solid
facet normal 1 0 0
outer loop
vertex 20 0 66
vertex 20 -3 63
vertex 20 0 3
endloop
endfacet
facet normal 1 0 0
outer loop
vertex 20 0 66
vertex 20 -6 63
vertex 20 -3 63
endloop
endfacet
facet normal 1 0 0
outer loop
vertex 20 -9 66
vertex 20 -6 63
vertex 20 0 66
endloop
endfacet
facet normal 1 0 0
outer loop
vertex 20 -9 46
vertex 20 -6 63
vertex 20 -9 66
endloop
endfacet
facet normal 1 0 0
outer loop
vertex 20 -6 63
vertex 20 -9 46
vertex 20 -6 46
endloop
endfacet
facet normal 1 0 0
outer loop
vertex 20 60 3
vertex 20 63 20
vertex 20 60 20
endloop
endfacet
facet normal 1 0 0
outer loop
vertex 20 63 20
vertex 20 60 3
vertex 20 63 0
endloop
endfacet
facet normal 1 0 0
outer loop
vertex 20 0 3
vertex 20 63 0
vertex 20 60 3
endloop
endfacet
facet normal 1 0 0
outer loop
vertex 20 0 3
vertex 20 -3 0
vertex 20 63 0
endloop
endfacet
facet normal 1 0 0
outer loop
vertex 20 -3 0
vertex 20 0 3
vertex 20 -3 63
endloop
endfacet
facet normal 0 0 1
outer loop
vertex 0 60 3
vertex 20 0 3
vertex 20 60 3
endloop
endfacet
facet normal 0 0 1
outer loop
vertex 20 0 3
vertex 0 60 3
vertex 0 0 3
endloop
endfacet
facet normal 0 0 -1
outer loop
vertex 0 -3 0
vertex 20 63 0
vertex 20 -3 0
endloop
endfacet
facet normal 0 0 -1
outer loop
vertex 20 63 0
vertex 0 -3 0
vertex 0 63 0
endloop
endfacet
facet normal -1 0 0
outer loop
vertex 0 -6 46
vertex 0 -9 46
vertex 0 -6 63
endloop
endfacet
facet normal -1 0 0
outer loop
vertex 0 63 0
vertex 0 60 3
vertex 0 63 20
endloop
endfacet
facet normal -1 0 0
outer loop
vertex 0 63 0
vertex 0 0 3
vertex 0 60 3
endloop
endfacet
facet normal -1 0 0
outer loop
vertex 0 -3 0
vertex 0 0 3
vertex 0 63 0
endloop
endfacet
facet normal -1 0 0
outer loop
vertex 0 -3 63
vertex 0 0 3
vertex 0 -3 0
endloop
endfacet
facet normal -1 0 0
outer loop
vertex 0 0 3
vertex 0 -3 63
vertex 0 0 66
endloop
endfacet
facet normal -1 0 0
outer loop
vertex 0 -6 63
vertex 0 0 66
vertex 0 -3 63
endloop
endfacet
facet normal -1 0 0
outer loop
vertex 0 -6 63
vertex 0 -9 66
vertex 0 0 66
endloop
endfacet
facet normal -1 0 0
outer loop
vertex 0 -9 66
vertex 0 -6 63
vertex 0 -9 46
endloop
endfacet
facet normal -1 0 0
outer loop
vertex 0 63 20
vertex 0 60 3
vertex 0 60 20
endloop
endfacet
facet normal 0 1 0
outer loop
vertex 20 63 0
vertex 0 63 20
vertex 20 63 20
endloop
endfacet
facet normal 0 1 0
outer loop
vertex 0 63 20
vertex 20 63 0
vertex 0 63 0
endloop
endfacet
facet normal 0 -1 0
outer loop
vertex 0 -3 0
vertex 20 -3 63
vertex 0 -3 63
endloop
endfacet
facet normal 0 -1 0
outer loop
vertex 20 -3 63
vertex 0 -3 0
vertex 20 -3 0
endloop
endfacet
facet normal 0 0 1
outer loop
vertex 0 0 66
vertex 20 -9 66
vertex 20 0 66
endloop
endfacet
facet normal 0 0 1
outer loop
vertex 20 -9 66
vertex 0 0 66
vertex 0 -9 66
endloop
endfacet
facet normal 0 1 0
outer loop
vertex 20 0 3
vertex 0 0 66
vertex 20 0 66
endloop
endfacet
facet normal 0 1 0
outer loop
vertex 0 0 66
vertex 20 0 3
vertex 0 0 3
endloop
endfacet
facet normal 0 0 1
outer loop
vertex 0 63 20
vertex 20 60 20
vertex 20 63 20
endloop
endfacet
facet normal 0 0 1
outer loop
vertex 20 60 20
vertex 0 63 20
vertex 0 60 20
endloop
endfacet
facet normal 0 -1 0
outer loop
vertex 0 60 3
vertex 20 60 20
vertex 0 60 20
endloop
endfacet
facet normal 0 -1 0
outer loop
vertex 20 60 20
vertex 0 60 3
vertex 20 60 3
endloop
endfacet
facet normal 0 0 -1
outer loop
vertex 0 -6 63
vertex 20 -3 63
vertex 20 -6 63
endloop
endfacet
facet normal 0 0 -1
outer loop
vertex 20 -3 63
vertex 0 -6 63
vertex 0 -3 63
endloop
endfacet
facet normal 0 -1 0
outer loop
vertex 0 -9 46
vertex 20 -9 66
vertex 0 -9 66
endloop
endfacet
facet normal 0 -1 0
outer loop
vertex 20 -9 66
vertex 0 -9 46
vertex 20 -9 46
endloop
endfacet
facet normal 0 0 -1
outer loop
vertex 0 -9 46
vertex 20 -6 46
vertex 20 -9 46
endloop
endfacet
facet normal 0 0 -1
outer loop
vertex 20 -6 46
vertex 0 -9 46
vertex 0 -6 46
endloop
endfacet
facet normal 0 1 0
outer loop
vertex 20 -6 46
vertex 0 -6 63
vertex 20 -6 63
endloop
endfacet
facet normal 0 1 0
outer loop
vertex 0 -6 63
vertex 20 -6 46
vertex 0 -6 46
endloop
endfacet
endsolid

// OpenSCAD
// file: grate.scad
include <../../library/profiles.scad>
include <./config.scad>

module grateTemplate(grateLength = 600, grateWidth = 400) {
    module partsList() {

    }

    partsList();

    // hinten
    cube([grateLength, profileSize + 5, profileSize+ 5]);
    
    // vorne
    translate([0, grateWidth - profileSize, 0])
    cube([grateLength, profileSize, profileSize]);
    

    // rippen
    amount = round(grateLength / 35);
    startPos = 18;
    echo(str("anzahl ", amount))
    for ( i = [0 : amount - 1] ) {
        translate([(i * 35) + startPos, 0, 45])
        rotate([45, 0.5, 90])
        lShapeProfile(grateWidth + 30, 20, 2);
    }
}

module grate() {
    grateLength = outerWidth - fireBasketWidth - (profileSize * 4) - (grateGap * 4) - ((4 * grateProfileThickness));
    grateWidth = outerDepth - profileSize - (6 * grateProfileThickness);

    grateTemplate(grateLength, grateWidth);
}

module halfGrate() {
    halfGrateLength = (outerWidth - fireBasketWidth - (profileSize * 4) - (grateGap * 4) - ((5 * grateProfileThickness))) / 2;
    grateWidth = outerDepth - profileSize - (6 * grateProfileThickness);

    grateTemplate(halfGrateLength, grateWidth);
}
// file: ../../library/profiles.scad
module lShapeProfile($length, $size, $thickness) {
    cube([$length, $size, $thickness]);
    rotate([90, 0, 0])
    translate([0, 0, -$thickness]) cube([$length, $size, $thickness]);
}


module uShapeProfile($length, $size, $thickness) {
    cube([$length, $size, $thickness]);
    rotate([90, 0, 0])
    translate([0, 0, -$thickness]) cube([$length, $size, $thickness]);

    translate([0, $size, 0])
    rotate([90, 0, 0])
    cube([$length, $size, $thickness]);
}


module squareTubeProfile($length, $size, $thickness) {
    cube([$length, $size, $thickness]);

    rotate([90, 0, 0])
    translate([0, 0, -$thickness])
    cube([$length, $size, $thickness]);

    translate([0, $size, 0])
    rotate([90, 0, 0])
    cube([$length, $size, $thickness]);

    translate([0, 0, $size - $thickness])
    cube([$length, $size, $thickness]);
}
// file: config.scad
drawReferences = false;
drawReferenceWall = false;

outerWidth = 1500;
outerDepth = 700;
outerHeight = 700;

profileSize = 40;

fireBasketHeight = 250;
fireBasketWidth = 400;
fireBasketGroundClearance = 100;
fireBasketFrontOpen = true;

spindleDiameter  = 20;
spindleOverlength = 5;
spindleWallExtension = 140;
spindleWheelDiameter = 200;
spindlePlateThickness = 5;
spindlePlateGap = 2;
spindleHandleThickness = 8;

grateGap = 4;
grateSize = 30;
grateProfileThickness = 3;

lineThickness = 1;
lineGap = 80;
textSize = 20;

$fn = 120;
// main file
include <./config.scad>

use <./grateFrame.scad>


collectingTrayMount();


// start csv header
collectingTrayMountPartsList();
